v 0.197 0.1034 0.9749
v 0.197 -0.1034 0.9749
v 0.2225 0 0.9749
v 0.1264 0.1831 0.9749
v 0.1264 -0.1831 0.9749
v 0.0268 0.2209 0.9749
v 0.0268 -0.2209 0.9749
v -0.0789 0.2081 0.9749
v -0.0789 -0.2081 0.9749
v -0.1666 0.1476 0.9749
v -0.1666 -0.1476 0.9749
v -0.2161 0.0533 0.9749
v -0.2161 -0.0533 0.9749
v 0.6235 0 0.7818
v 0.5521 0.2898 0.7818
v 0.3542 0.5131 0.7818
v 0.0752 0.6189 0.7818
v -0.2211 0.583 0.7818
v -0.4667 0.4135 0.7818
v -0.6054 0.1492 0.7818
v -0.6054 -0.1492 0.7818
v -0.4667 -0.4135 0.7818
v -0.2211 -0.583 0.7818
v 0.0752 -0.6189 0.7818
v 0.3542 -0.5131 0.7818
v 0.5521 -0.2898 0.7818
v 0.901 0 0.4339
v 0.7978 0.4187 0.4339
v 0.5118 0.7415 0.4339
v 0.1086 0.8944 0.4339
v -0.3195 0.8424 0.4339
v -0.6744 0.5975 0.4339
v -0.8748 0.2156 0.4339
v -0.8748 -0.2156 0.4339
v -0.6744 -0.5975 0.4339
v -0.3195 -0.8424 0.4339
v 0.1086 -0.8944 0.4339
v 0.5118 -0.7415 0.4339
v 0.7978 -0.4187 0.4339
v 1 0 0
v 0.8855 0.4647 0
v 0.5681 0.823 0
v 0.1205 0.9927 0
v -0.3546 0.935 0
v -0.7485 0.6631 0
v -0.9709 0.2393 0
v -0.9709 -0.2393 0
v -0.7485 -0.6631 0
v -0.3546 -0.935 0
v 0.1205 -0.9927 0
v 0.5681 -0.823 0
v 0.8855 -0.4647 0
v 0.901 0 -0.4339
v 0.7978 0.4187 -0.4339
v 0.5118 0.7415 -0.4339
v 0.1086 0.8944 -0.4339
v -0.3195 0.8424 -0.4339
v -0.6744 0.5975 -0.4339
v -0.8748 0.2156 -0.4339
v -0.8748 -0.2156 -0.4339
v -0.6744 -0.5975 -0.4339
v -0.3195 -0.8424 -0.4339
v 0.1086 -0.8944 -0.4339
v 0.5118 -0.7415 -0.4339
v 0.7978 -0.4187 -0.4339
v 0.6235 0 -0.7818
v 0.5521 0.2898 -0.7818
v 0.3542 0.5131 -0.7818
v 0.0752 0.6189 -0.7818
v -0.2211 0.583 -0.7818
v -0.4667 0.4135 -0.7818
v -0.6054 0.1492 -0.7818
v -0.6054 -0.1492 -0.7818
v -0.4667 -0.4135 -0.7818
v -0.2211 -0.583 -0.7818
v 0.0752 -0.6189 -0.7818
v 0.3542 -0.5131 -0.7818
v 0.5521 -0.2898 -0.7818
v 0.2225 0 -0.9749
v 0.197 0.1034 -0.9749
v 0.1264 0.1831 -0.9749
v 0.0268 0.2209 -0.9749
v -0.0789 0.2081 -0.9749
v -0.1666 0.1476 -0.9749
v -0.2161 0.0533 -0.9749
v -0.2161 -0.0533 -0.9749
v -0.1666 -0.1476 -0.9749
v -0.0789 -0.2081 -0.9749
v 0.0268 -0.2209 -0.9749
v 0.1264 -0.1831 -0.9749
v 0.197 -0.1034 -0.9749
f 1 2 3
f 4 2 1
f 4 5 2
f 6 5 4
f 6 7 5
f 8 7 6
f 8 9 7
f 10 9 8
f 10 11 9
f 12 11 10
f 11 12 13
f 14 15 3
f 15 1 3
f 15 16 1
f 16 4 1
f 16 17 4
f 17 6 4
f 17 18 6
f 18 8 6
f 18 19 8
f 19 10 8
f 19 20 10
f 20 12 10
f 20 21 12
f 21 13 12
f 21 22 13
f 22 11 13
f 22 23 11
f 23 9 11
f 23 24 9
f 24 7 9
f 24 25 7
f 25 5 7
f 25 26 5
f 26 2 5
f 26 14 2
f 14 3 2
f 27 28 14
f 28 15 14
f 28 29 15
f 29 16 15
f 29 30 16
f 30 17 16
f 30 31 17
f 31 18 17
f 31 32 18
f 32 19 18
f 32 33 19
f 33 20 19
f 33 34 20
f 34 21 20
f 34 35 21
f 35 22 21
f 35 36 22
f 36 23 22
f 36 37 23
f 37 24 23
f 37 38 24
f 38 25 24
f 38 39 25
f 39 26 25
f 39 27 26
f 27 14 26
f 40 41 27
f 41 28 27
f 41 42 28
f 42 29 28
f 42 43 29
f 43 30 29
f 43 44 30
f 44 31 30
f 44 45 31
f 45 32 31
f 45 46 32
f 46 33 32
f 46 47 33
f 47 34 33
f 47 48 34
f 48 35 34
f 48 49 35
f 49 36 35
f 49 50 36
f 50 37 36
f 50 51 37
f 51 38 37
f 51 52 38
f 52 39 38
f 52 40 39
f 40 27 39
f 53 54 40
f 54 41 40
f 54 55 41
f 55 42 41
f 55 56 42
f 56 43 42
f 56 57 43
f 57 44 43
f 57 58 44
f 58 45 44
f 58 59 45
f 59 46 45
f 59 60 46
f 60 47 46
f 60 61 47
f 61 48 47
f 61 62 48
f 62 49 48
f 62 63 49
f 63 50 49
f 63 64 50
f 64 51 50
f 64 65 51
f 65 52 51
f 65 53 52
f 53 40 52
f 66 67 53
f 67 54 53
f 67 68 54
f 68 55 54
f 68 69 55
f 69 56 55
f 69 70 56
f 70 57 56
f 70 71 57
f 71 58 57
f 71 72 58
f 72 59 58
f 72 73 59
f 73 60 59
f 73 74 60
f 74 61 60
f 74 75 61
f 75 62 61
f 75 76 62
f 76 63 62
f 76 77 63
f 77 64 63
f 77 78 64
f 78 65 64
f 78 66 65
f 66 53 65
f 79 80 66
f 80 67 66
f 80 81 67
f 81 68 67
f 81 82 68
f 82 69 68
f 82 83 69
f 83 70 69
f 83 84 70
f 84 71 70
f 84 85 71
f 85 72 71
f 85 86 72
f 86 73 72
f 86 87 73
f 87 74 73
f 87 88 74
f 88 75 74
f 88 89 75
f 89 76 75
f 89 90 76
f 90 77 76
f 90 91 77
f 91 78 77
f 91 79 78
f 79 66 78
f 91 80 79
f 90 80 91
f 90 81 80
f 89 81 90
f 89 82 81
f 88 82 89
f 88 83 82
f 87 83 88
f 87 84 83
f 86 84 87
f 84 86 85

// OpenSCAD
$fa = 1;
$fs = 0.5; 

%minkowski() { 
    cylinder(1,1,1);
    //sphere(1);
}
sphere(1);
